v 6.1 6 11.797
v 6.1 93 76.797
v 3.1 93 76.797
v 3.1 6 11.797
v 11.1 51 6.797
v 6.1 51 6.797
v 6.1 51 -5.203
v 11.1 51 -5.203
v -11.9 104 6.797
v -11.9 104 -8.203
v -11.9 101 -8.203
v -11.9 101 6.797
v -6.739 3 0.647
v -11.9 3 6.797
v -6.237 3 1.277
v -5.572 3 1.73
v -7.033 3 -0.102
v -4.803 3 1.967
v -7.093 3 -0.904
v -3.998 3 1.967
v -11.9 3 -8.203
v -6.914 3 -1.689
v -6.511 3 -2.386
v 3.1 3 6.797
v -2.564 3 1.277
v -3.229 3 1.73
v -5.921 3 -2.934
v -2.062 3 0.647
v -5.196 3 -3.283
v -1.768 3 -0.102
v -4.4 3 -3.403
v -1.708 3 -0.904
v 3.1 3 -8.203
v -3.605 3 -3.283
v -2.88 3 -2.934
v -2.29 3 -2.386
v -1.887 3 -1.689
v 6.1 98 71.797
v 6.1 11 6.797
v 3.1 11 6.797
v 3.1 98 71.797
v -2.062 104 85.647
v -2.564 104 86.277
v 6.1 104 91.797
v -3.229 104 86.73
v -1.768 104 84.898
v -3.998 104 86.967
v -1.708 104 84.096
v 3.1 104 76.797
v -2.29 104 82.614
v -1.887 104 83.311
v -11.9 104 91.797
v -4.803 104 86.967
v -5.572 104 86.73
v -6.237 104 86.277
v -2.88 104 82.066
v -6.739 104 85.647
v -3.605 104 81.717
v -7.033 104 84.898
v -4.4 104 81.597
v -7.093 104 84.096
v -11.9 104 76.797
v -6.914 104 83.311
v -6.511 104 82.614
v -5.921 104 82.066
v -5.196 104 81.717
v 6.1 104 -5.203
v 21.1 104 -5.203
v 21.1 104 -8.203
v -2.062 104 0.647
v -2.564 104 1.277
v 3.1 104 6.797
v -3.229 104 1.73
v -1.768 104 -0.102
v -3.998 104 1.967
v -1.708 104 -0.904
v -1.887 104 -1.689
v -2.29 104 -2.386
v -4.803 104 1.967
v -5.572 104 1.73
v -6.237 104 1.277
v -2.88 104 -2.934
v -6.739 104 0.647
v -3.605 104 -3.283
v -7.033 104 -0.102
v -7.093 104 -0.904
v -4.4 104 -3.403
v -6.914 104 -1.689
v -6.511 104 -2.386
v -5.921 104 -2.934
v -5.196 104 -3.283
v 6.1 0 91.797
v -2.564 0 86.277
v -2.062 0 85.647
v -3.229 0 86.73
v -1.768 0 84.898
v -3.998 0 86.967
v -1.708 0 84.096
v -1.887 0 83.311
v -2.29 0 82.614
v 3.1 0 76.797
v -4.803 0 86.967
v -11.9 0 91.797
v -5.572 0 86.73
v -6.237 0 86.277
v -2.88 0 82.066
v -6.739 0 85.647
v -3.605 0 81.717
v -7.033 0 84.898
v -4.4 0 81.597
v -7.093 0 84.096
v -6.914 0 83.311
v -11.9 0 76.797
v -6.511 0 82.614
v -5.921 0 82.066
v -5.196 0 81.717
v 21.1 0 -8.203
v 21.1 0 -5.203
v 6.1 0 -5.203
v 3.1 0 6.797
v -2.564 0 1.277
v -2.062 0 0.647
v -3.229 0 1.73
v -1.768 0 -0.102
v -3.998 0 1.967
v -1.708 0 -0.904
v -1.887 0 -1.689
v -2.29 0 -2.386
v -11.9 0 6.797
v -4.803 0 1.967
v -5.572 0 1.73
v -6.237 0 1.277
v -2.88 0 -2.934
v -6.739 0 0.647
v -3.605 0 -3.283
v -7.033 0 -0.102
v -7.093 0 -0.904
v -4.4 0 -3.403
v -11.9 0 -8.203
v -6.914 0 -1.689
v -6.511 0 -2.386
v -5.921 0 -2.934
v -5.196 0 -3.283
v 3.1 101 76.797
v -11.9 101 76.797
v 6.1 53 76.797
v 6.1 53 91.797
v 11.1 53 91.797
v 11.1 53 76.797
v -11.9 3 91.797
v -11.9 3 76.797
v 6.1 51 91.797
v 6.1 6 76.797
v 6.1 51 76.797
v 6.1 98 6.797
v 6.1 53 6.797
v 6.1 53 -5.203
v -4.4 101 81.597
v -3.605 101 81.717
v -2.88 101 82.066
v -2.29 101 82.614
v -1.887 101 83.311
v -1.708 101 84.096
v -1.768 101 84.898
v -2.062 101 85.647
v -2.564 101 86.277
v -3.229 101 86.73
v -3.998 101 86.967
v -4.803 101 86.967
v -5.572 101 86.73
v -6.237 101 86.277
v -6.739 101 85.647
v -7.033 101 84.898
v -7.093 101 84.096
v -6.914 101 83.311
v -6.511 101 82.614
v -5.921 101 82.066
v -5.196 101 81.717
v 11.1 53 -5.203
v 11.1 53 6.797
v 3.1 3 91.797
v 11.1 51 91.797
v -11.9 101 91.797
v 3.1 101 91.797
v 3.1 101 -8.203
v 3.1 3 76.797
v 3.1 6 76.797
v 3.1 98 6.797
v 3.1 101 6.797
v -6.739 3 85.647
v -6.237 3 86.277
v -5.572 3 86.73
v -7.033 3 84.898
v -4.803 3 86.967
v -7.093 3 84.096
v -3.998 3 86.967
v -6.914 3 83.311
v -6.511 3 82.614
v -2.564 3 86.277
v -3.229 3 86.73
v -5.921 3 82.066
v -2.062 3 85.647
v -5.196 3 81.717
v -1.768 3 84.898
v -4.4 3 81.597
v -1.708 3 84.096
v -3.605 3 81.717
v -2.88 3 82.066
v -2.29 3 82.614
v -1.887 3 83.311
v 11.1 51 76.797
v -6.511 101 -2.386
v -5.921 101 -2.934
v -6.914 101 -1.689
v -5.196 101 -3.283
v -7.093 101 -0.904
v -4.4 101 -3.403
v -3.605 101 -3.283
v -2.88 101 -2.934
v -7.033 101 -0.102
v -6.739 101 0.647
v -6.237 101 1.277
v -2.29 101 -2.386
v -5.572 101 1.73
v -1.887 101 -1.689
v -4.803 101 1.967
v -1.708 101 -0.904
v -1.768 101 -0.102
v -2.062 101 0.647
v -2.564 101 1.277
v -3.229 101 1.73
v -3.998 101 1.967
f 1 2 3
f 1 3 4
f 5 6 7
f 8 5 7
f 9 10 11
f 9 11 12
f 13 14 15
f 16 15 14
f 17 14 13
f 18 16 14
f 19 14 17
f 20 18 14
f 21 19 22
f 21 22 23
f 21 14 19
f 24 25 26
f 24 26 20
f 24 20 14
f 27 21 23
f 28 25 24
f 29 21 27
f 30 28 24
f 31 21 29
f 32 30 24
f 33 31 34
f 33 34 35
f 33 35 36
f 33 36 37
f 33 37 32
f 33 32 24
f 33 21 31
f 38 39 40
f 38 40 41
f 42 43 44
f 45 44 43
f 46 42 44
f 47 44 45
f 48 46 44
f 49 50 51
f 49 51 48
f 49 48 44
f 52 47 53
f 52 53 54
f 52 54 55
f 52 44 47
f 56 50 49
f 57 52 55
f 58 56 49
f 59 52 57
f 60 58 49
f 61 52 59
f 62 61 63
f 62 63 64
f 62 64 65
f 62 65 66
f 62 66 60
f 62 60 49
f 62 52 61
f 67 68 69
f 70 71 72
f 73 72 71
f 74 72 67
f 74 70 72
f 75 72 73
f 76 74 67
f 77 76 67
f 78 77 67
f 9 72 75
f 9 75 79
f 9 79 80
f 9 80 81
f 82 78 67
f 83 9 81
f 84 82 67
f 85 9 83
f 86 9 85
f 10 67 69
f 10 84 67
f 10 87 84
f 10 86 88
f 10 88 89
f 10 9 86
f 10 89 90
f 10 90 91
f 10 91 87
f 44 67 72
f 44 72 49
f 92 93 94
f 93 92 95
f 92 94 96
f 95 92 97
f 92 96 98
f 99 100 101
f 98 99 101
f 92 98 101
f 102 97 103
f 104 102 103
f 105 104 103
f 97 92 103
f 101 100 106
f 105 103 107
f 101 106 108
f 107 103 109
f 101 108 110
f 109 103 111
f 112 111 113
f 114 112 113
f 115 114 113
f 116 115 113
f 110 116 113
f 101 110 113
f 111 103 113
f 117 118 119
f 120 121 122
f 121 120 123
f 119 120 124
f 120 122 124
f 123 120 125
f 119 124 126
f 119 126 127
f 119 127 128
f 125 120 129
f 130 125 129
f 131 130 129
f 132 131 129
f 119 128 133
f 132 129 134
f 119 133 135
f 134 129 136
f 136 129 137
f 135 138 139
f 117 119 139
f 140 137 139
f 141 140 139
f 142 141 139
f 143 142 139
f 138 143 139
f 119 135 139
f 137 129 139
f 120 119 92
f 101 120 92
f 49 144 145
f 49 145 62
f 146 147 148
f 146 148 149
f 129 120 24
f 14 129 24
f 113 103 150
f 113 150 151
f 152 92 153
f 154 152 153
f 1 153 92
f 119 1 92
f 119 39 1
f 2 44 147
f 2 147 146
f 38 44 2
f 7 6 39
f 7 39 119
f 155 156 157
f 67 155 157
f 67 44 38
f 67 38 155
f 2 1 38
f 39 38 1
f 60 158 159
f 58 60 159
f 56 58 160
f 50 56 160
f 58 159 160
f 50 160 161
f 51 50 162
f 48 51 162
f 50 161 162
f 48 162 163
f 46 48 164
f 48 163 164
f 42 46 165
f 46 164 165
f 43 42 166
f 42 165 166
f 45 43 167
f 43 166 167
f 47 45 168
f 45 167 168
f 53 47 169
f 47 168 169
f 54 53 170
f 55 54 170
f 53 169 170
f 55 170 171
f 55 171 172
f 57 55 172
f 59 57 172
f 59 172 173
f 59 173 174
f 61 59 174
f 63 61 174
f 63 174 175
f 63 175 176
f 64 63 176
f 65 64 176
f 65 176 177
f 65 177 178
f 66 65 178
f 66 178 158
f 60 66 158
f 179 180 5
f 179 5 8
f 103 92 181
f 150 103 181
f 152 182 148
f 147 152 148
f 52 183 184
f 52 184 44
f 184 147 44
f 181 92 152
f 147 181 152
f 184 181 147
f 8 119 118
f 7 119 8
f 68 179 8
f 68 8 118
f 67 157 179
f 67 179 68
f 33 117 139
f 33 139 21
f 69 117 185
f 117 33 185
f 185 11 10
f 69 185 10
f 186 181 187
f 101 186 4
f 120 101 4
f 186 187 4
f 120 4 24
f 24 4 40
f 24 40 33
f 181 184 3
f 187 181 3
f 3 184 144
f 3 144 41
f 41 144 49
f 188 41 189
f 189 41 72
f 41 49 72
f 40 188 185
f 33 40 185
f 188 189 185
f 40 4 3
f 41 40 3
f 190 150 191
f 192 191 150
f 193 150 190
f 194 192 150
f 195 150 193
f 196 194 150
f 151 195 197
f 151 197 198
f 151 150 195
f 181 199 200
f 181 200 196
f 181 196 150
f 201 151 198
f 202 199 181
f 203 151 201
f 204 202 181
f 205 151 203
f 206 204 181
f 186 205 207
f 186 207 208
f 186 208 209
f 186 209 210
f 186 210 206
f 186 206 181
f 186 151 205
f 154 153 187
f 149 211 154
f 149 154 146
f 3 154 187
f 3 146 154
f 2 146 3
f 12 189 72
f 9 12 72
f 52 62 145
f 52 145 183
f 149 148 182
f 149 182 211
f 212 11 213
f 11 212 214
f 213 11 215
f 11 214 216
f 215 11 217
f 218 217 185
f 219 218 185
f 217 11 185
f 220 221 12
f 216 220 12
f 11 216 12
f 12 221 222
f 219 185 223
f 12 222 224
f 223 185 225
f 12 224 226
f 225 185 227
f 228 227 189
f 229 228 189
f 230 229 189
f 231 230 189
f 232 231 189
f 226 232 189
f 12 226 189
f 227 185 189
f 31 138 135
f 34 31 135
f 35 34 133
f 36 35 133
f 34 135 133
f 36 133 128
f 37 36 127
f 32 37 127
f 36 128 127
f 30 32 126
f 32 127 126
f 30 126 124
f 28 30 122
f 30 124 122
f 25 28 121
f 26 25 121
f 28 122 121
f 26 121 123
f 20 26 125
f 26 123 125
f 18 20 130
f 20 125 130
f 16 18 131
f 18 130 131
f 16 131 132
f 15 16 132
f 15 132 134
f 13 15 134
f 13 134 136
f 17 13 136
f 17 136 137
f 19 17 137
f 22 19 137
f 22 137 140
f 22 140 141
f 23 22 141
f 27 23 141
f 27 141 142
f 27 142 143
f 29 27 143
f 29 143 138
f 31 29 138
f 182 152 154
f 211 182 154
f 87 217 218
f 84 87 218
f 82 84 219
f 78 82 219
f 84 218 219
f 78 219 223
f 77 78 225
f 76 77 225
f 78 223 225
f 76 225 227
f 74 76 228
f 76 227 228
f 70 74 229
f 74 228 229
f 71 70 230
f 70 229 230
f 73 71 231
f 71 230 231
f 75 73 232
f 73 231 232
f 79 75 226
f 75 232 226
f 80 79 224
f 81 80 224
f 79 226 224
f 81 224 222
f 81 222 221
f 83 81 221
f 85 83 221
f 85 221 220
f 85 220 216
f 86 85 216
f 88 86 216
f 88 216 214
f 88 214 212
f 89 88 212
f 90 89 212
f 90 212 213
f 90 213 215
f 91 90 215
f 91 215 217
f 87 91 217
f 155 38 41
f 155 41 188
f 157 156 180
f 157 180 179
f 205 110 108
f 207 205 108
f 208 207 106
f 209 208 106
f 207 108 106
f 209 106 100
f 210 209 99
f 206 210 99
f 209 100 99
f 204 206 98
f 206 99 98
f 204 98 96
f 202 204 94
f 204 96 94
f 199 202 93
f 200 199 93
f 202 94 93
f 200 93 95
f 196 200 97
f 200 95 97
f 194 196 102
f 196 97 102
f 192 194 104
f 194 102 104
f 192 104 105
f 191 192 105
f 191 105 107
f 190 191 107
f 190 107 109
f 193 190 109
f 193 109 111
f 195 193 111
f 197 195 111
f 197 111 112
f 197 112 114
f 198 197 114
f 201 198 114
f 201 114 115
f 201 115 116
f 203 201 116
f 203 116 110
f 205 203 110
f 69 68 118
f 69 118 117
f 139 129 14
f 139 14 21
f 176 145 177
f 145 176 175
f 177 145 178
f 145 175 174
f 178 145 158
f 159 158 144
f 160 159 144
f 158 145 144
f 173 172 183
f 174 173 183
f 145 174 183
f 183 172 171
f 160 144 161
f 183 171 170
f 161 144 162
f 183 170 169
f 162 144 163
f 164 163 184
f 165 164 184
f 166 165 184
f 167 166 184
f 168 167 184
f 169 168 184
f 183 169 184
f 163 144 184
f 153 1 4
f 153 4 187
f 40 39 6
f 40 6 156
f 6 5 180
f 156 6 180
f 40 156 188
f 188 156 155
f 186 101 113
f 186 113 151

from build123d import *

# Parameters (mm, degrees)
SKETCH2_W           = 15
SKETCH2_H           = 15
BOSS_EXTRUDE1_DEPTH = 3
SKETCH3_W           = 3
SKETCH3_H           = 15
BOSS_EXTRUDE2_DEPTH = 104
SKETCH4_W           = 15
SKETCH4_H           = 3
BOSS_EXTRUDE3_DEPTH = 15
SKETCH5_R           = 2.7
CUT_EXTRUDE1_DEPTH  = 105.999550604
SKETCH6_W           = 15
SKETCH6_H           = 2
BOSS_EXTRUDE4_DEPTH = 5
BOSS_EXTRUDE5_DEPTH = 3
SKETCH9_W           = 3
SKETCH9_H           = 104
BOSS_EXTRUDE6_DEPTH = 15


with BuildPart() as part:
    # Sketch2 → Boss-Extrude1 (new body)
    with BuildSketch(Plane(origin=(0, 0, 0), x_dir=(1, 0, 0), z_dir=(0, 1, 0))):
        with Locations((-4.400493642, 0.702675063)):
            Rectangle(SKETCH2_W, SKETCH2_H)
    extrude(amount=BOSS_EXTRUDE1_DEPTH)

    # Sketch3 → Boss-Extrude2 (add)
    with BuildSketch(Plane(origin=(0, 0, 0), x_dir=(1, 0, 0), z_dir=(0, 1, 0))):
        with Locations((4.599506358, 0.702675063)):
            Rectangle(SKETCH3_W, SKETCH3_H)
    extrude(amount=BOSS_EXTRUDE2_DEPTH)

    # Sketch4 → Boss-Extrude3 (add)
    with BuildSketch(Plane.ZY.offset(-3.099506358)):
        with Locations((-0.702675063, 102.5)):
            Rectangle(SKETCH4_W, SKETCH4_H)
    extrude(amount=BOSS_EXTRUDE3_DEPTH)

    # Sketch5 → Cut-Extrude1 (cut, through all)
    with BuildSketch(Plane.XZ):
        with Locations(Location((-4.400493642, -0.702675063, 0), (0, 0, 270))):
            Circle(SKETCH5_R)
    extrude(amount=-CUT_EXTRUDE1_DEPTH, mode=Mode.SUBTRACT)

    # Sketch6 → Boss-Extrude4 (add)
    with BuildSketch(Plane(origin=(6.099506358, 0, 0), x_dir=(0, 0, -1), z_dir=(1, 0, 0))):
        with Locations((0.702675063, 52)):
            Rectangle(SKETCH6_W, SKETCH6_H)
    extrude(amount=BOSS_EXTRUDE4_DEPTH)


with BuildPart() as body_2:
    # Body-Move/Copy2: copy of part
    add(part.part.moved(Location((0, 0, 85))))


with BuildPart() as part_1:
    add(part.part)

    add(body_2.part)  # Boss-Extrude5 merges body 2
    # Sketch8 → Boss-Extrude5 (add)
    with BuildSketch(Plane.ZY.offset(-6.099506358)):
        Polygon((6.797324937, 104), (76.797324937, 104), (76.797324937, 98), (76.797324937, 93), (11.797324937, 6), (76.797324937, 6), (76.797324937, 0), (6.797324937, 0), (6.797324937, 6), (6.797324937, 11), (71.797324937, 98), (6.797324937, 98), align=None)
    extrude(amount=BOSS_EXTRUDE5_DEPTH)

    # Sketch9 → Boss-Extrude6 (add)
    with BuildSketch(Plane(origin=(6.099506358, 0, 0), x_dir=(0, 0, -1), z_dir=(1, 0, 0))):
        with Locations((6.702675063, 52)):
            Rectangle(SKETCH9_W, SKETCH9_H)
    extrude(amount=BOSS_EXTRUDE6_DEPTH)


solid = part_1.part
